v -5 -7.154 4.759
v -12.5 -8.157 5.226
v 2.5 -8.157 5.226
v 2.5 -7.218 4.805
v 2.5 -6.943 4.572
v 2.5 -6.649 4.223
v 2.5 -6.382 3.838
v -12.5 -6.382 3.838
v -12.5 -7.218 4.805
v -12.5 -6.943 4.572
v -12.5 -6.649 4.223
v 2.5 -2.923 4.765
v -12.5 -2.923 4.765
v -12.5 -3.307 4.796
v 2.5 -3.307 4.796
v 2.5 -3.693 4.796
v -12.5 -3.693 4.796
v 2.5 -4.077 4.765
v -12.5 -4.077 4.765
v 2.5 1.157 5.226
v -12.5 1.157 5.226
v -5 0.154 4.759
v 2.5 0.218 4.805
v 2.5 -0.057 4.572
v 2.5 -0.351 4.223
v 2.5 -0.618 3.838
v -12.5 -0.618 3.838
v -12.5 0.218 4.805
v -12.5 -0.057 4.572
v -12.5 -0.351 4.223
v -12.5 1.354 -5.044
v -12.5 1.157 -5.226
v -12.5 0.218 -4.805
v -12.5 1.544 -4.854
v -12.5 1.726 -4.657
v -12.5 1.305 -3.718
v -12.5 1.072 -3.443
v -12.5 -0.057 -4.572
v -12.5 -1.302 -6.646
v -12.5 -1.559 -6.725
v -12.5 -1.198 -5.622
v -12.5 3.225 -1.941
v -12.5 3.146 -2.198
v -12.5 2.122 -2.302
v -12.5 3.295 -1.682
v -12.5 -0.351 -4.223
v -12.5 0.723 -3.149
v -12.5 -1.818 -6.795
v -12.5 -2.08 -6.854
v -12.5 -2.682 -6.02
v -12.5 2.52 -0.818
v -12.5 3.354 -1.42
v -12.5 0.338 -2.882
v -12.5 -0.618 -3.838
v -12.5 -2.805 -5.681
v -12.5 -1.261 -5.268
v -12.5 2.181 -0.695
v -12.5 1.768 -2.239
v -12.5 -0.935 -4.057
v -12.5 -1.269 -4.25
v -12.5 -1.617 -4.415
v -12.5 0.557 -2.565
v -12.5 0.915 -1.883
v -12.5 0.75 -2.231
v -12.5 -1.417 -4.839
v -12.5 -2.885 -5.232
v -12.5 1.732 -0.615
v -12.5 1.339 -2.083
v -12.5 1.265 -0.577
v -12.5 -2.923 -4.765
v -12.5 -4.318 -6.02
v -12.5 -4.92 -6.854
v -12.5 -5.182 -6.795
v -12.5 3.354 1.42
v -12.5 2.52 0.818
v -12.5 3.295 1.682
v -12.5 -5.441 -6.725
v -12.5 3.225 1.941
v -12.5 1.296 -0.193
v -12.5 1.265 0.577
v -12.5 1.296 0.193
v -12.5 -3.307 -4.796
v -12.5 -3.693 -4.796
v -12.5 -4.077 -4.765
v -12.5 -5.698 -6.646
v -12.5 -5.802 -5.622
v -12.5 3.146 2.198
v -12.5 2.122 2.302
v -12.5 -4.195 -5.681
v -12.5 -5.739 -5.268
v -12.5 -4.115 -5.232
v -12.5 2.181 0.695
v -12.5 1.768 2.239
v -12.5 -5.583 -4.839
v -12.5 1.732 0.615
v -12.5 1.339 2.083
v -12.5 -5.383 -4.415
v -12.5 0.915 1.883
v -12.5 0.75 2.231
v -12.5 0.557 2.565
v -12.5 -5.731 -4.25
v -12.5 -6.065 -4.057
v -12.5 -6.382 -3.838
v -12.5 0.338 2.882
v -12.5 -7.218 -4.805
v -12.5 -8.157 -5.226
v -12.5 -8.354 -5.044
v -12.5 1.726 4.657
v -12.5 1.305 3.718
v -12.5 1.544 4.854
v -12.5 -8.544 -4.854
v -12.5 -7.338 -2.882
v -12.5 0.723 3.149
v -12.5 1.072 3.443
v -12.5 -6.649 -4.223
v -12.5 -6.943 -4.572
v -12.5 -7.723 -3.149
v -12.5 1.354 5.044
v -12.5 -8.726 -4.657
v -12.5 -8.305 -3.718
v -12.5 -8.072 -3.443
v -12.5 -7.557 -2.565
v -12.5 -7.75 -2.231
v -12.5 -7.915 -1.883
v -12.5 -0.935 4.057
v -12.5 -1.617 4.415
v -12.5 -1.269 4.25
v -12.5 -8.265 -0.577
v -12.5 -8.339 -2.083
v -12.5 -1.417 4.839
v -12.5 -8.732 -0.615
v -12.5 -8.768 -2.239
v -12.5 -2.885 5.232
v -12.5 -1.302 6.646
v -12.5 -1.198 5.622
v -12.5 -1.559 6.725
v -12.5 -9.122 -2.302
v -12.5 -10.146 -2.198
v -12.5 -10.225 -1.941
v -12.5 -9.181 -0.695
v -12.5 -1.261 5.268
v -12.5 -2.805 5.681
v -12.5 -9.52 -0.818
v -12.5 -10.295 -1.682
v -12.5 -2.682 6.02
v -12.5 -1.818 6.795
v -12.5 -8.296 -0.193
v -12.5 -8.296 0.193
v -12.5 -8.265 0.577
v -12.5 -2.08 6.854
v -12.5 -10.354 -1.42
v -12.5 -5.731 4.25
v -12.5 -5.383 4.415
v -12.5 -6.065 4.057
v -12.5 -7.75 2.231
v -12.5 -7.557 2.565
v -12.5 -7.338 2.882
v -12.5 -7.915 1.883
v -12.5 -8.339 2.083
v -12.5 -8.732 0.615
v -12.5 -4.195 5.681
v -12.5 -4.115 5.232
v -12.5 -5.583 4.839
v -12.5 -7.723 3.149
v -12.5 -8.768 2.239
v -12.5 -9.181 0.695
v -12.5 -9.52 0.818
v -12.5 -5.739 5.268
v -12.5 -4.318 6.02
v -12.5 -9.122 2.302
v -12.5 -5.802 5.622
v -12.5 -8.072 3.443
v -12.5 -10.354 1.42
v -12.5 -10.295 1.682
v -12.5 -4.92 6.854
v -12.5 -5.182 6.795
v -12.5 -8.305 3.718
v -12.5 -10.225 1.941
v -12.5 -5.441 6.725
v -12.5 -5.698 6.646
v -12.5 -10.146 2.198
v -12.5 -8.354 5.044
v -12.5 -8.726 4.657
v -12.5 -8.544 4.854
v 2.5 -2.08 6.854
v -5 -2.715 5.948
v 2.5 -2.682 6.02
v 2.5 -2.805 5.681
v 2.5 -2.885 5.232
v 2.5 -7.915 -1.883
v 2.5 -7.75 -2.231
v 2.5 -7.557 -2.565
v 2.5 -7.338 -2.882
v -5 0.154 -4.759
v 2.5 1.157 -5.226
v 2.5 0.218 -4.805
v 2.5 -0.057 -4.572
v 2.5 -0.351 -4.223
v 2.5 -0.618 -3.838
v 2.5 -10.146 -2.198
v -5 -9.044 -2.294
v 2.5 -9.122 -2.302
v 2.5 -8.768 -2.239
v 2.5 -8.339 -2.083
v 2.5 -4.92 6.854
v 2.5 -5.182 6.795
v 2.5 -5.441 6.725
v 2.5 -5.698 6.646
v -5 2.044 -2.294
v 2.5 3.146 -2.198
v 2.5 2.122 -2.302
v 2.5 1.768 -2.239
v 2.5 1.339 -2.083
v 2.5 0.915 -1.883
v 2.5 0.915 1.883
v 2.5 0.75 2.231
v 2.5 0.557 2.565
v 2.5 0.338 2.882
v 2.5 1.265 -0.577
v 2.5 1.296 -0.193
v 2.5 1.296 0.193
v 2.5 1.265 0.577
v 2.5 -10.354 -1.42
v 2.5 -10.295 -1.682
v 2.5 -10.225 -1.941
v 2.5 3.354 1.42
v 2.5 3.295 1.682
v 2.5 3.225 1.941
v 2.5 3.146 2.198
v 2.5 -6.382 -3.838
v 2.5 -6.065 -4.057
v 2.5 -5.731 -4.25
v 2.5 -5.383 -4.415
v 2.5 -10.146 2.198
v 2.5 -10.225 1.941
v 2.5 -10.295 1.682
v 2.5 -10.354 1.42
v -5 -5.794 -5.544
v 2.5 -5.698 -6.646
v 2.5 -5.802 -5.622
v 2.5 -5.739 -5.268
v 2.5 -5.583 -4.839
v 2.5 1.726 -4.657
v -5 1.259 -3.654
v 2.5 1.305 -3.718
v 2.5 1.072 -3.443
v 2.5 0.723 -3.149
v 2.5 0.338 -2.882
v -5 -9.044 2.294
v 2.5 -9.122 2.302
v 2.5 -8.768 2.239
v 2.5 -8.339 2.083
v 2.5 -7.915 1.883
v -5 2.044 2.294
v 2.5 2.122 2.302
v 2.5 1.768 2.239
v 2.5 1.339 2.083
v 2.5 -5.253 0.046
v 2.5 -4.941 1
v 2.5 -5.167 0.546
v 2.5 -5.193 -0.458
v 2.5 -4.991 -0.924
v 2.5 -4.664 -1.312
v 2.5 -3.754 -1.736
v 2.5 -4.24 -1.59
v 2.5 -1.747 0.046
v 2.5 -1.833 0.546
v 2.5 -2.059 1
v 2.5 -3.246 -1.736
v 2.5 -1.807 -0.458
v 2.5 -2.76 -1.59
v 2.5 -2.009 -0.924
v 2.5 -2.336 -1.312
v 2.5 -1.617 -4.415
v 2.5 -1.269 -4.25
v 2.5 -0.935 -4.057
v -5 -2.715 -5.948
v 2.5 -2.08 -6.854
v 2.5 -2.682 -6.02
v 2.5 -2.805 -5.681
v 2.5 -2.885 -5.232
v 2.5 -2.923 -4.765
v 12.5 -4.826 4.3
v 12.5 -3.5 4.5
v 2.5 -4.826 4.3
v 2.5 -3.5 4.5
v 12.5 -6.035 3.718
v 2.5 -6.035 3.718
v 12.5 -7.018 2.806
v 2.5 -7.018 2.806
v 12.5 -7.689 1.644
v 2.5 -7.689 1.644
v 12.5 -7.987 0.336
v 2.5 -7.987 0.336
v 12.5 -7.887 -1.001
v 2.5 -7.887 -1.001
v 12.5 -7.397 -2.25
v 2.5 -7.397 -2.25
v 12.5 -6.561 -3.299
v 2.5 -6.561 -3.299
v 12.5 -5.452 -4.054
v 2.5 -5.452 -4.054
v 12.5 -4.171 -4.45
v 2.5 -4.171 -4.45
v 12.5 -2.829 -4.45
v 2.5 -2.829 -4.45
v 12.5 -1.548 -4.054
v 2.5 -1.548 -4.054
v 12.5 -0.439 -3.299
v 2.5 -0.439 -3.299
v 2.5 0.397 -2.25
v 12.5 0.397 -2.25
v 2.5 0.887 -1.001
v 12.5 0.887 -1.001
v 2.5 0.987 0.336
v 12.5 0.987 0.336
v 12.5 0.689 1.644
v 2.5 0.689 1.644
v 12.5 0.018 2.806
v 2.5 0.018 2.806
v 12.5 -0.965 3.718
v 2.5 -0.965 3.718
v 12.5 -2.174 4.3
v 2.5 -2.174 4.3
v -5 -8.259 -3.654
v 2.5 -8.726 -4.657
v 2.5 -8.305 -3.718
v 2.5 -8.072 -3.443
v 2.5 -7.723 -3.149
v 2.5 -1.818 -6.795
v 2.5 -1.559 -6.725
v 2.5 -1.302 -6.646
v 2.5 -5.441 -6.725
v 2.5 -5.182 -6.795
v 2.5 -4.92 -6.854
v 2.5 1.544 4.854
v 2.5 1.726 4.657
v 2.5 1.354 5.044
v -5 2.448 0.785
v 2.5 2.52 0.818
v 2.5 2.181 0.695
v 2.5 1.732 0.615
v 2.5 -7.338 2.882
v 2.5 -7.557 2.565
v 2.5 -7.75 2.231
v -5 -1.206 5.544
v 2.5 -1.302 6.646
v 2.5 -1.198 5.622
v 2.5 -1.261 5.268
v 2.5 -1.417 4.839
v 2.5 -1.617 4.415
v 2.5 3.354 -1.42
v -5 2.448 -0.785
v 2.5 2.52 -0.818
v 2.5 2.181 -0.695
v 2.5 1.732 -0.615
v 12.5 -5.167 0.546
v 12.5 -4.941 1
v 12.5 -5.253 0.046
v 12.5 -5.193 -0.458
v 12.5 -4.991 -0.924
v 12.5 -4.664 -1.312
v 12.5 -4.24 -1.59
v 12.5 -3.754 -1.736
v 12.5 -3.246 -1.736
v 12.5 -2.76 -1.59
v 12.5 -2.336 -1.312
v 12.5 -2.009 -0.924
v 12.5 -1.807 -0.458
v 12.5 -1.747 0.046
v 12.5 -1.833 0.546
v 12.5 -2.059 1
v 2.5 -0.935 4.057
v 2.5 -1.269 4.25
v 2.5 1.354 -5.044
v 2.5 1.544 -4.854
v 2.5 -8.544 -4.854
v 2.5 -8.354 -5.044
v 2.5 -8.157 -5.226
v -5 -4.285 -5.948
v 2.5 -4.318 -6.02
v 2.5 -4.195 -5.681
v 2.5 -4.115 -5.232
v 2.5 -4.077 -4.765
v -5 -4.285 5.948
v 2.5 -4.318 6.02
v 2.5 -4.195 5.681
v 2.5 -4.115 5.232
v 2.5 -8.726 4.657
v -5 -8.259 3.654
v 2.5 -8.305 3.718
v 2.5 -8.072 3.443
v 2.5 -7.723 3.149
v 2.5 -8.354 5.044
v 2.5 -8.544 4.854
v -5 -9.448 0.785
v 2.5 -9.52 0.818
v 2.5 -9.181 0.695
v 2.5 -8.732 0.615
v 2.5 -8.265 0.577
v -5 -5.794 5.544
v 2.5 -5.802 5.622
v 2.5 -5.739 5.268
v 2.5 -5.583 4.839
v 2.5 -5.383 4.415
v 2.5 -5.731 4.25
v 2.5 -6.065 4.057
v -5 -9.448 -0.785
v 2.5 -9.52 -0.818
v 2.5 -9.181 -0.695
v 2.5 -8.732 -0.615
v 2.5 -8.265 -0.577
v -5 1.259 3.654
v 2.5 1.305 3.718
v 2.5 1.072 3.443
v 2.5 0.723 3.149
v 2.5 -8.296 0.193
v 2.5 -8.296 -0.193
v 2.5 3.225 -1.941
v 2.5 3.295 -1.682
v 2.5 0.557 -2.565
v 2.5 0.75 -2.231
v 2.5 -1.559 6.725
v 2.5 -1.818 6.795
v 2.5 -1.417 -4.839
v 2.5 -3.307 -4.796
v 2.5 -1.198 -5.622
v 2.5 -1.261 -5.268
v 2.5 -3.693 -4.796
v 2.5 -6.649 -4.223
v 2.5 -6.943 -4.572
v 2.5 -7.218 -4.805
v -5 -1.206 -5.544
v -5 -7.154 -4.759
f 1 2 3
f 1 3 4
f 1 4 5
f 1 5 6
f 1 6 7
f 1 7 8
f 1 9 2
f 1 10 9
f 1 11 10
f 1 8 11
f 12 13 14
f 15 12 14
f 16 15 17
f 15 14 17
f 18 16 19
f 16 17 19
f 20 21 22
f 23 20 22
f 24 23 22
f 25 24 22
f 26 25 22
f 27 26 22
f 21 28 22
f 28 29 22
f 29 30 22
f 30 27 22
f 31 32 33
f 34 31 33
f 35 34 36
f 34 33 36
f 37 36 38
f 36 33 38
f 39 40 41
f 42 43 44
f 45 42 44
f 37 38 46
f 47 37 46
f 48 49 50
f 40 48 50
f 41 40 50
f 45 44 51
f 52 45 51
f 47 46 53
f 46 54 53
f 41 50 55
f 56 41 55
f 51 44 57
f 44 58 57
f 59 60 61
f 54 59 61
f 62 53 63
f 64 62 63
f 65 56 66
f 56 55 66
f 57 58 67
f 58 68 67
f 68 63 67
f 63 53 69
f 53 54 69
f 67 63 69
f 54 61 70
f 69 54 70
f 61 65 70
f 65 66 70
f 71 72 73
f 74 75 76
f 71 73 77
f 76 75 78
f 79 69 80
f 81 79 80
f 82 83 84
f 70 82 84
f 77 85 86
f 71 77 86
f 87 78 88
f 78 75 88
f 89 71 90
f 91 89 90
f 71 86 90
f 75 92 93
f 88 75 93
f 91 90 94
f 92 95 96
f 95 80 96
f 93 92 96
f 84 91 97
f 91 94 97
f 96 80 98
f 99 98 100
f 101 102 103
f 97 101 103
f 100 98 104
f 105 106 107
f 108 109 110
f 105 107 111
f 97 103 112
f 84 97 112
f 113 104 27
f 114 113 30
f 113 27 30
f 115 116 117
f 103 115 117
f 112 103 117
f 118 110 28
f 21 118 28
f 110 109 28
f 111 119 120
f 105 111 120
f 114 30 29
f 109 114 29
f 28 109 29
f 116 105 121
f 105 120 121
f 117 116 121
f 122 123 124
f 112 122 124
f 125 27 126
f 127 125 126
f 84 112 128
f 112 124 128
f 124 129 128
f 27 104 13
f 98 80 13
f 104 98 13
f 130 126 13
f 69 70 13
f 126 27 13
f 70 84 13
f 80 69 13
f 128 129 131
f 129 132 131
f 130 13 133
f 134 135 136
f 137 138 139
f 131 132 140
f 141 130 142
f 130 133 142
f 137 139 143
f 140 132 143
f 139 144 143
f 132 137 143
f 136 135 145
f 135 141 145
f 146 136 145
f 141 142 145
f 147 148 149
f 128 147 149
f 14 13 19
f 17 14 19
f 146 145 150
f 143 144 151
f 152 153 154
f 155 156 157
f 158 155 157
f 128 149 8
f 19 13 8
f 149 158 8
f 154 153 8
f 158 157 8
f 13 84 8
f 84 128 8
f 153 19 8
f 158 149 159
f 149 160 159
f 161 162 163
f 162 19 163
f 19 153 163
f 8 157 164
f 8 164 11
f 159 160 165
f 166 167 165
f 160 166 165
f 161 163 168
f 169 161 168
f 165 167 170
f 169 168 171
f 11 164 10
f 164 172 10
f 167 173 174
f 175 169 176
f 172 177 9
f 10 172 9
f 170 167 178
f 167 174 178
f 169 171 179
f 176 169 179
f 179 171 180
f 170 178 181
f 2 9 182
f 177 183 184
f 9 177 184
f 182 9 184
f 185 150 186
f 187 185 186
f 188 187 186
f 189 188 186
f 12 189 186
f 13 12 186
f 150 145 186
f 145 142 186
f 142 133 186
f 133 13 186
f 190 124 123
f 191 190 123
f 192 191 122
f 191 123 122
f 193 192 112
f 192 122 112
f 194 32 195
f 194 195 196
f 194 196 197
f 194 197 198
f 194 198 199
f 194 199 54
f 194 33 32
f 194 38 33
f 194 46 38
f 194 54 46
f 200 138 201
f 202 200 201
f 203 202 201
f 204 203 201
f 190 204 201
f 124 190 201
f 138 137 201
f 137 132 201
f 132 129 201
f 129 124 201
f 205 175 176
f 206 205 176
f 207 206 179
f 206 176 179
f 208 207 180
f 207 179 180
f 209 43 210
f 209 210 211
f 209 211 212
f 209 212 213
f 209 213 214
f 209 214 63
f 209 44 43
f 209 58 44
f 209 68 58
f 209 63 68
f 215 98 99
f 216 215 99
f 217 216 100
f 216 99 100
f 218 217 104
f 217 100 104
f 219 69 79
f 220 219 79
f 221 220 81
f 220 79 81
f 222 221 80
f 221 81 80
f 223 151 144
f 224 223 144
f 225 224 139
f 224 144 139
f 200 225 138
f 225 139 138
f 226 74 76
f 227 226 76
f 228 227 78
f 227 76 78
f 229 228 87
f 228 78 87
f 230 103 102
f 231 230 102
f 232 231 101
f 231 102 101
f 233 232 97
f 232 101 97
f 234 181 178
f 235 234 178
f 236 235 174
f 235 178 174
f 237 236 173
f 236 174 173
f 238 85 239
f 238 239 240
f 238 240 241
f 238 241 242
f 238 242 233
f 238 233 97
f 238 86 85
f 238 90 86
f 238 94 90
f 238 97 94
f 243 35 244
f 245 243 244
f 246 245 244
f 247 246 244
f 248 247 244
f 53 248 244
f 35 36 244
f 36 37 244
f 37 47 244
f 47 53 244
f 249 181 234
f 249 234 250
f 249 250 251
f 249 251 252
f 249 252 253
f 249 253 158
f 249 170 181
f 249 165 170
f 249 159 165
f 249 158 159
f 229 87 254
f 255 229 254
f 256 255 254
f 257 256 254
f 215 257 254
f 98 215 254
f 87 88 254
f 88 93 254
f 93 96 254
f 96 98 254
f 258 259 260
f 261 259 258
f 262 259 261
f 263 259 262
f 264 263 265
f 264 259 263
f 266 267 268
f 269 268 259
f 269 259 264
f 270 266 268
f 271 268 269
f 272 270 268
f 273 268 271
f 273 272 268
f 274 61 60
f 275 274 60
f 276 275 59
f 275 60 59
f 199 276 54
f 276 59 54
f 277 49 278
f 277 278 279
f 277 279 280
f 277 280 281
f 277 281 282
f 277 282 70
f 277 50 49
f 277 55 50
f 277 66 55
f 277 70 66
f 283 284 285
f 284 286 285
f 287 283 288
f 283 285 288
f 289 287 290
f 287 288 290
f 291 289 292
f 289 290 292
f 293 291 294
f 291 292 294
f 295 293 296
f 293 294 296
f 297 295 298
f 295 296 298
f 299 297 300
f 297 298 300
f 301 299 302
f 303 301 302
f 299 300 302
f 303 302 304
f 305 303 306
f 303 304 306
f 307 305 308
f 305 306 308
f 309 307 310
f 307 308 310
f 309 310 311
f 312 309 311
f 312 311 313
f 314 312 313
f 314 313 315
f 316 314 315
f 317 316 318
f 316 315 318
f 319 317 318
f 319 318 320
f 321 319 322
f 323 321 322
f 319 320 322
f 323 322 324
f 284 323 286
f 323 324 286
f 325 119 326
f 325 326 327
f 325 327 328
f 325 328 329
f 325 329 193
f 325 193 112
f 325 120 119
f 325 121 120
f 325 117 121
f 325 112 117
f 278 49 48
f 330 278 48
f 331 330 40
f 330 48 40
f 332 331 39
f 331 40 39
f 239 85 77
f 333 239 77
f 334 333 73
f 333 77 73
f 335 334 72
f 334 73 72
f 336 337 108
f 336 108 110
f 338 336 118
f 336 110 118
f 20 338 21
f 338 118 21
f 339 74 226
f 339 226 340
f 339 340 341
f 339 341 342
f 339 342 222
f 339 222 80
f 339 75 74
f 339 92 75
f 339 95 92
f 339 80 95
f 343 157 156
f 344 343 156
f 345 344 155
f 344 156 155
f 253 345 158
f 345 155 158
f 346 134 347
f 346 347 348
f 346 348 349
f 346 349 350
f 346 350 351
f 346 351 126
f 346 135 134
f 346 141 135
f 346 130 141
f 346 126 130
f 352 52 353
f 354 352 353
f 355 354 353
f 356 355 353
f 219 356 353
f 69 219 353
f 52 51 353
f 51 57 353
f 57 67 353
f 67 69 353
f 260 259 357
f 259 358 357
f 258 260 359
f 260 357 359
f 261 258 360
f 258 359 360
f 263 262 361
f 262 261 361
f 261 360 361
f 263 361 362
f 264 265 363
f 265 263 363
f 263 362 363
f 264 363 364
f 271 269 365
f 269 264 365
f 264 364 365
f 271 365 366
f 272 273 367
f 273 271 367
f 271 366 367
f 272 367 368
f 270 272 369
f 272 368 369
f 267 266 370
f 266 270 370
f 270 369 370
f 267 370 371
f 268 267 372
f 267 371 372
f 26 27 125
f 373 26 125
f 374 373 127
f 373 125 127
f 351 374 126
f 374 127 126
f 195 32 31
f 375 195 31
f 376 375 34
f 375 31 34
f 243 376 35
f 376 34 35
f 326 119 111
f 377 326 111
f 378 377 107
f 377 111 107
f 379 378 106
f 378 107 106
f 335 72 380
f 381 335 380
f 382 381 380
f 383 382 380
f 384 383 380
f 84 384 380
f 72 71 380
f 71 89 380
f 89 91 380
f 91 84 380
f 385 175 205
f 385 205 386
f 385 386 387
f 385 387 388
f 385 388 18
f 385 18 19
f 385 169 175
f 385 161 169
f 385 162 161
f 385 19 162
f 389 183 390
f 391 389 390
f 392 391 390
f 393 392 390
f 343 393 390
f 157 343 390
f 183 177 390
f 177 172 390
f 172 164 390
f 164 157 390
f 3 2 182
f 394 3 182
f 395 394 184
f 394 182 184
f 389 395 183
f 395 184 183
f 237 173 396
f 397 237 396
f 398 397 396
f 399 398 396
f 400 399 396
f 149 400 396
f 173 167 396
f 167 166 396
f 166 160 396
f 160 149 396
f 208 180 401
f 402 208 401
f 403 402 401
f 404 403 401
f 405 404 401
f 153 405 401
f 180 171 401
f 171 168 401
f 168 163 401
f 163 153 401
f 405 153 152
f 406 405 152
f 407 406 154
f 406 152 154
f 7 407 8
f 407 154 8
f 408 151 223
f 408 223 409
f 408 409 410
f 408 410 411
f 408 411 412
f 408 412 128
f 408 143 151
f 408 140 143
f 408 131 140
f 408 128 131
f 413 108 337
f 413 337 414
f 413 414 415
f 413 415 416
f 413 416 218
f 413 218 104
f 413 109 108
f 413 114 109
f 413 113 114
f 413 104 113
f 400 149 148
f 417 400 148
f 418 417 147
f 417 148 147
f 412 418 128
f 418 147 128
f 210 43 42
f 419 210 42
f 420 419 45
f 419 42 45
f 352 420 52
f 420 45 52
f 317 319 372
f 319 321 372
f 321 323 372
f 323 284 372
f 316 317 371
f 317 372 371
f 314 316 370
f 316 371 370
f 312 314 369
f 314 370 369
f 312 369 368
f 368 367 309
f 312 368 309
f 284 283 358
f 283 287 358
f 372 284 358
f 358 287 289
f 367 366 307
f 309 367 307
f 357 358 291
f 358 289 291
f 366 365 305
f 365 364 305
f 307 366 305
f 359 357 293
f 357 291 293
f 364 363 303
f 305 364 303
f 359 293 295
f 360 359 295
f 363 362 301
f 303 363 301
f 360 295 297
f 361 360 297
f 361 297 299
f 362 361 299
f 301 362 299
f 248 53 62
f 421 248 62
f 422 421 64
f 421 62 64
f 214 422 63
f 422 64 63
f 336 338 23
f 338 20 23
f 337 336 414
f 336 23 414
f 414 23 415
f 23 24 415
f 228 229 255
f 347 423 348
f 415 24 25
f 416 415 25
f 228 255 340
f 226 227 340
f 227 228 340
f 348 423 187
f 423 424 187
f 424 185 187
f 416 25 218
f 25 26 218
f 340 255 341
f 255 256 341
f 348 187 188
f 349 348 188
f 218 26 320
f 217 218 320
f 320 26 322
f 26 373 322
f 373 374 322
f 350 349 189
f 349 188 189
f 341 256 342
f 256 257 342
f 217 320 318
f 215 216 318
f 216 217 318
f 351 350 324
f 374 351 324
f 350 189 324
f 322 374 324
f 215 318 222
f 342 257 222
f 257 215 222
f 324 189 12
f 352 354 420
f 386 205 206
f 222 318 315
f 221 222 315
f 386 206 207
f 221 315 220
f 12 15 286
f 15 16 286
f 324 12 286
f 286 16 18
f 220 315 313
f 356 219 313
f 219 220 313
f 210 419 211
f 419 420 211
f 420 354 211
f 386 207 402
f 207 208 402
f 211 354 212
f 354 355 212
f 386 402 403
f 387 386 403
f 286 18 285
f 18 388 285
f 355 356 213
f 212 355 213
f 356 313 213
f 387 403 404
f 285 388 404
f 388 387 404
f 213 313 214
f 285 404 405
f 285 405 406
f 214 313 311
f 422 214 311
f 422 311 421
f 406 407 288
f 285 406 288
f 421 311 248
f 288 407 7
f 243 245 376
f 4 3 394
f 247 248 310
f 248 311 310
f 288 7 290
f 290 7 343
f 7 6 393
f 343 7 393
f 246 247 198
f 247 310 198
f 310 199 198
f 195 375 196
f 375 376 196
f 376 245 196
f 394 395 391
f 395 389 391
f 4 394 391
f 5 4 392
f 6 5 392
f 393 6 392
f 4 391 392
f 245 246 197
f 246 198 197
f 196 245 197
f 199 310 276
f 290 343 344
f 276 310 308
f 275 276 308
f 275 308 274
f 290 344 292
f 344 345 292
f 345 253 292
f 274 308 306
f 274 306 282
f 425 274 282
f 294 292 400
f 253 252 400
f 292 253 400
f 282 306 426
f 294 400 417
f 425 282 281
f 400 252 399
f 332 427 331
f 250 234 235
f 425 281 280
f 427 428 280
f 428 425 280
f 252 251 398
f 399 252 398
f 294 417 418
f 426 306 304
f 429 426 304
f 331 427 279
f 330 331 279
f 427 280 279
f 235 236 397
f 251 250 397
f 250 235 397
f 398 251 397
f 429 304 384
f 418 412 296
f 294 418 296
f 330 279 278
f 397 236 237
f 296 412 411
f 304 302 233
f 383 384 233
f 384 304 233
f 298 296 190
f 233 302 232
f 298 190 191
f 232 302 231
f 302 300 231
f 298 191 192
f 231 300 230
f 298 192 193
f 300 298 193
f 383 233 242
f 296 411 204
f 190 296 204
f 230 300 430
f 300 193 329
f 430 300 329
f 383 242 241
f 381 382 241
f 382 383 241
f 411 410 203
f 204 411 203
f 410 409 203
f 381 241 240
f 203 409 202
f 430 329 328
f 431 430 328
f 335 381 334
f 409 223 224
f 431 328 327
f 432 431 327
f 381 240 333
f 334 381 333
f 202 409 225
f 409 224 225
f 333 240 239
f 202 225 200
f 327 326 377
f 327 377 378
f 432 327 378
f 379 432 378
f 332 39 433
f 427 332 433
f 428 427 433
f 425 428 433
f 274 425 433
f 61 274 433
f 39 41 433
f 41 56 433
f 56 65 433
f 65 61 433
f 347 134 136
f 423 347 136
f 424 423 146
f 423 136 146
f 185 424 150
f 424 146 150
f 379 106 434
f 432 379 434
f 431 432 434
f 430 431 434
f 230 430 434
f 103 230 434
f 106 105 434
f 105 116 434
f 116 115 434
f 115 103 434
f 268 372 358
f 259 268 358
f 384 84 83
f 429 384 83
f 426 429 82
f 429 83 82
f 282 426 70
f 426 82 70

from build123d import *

# Parameters (mm, degrees)
KUGGLUCKA_DEPTH     = 15
CIRPATTERN_COUNT    = 12
SKETCH1_R           = 1.754
CUT_EXTRUDE1_DEPTH  = 10
BOSS_EXTRUDE1_DEPTH = 10


with BuildPart() as part:
    # Ritning 1 → Kugghjulsämne (revolve)
    with BuildSketch(Plane.XY, mode=Mode.PRIVATE) as kugghjuls_mne_sk:
        Polygon((12.5, 1), (2.5, 1), (2.5, 3.5), (-12.5, 3.5), (-12.5, -3.5), (12.5, -3.5), align=None)
    revolve(kugghjuls_mne_sk.sketch.rotate(Axis((-12.5, -3.5, 0), (1, 0, 0)), 90), axis=Axis((-12.5, -3.5, 0), (1, 0, 0)))

    # Ritning 2 → Kugglucka (cut)
    with BuildSketch(Plane.ZY.offset(12.5)):
        with BuildLine():
            Line((1.419865071, 3.354486354), (0, 4.774351425))
            Line((0, 4.774351425), (-1.419865071, 3.354486354))
            add(Edge.make_bspline(
                [(-1.419865071, 3.354486354), (-1.173032372, 3.067088657), (-0.658113481, 2.467546927), (-0.604624671, 1.6768746), (-0.576776379, 1.265220772)],
                knots=[0, 0, 0, 0, 0.479362292, 1, 1, 1, 1], degree=3))
            ThreePointArc((-0.576776379, 1.265220772), (0, 1.3), (0.576776379, 1.265220772))
            add(Edge.make_bspline(
                [(1.419865071, 3.354486354), (1.173032372, 3.067088657), (0.658113481, 2.467546927), (0.604624671, 1.6768746), (0.576776379, 1.265220772)],
                knots=[0, 0, 0, 0, 0.479362292, 1, 1, 1, 1], degree=3))
        make_face()
    kugglucka = extrude(amount=-KUGGLUCKA_DEPTH, mode=Mode.SUBTRACT)

    # CirPattern: Kugglucka ×12 about axis
    cirpattern_axis = Axis((-12.5, -3.5, 0), (-1, 0, 0))
    for i in range(1, CIRPATTERN_COUNT):
        add(kugglucka.rotate(cirpattern_axis, i * 360 / CIRPATTERN_COUNT), mode=Mode.SUBTRACT)

    # Sketch1 → Cut-Extrude1 (cut)
    with BuildSketch(Plane(origin=(12.5, 0, 0), x_dir=(0, 0, -1), z_dir=(1, 0, 0))):
        with Locations((0, -3.5)):
            Circle(SKETCH1_R)
    extrude(amount=-CUT_EXTRUDE1_DEPTH, mode=Mode.SUBTRACT)

    # Sketch3 → Boss-Extrude1 (add)
    with BuildSketch(Plane(origin=(12.5, 0, 0), x_dir=(0, 0, -1), z_dir=(1, 0, 0))):
        Polygon((-1, -1.322696024), (-1, -6.208852365), (-3.330635242, -3.367112903), align=None)
    extrude(amount=-BOSS_EXTRUDE1_DEPTH)


solid = part.part
